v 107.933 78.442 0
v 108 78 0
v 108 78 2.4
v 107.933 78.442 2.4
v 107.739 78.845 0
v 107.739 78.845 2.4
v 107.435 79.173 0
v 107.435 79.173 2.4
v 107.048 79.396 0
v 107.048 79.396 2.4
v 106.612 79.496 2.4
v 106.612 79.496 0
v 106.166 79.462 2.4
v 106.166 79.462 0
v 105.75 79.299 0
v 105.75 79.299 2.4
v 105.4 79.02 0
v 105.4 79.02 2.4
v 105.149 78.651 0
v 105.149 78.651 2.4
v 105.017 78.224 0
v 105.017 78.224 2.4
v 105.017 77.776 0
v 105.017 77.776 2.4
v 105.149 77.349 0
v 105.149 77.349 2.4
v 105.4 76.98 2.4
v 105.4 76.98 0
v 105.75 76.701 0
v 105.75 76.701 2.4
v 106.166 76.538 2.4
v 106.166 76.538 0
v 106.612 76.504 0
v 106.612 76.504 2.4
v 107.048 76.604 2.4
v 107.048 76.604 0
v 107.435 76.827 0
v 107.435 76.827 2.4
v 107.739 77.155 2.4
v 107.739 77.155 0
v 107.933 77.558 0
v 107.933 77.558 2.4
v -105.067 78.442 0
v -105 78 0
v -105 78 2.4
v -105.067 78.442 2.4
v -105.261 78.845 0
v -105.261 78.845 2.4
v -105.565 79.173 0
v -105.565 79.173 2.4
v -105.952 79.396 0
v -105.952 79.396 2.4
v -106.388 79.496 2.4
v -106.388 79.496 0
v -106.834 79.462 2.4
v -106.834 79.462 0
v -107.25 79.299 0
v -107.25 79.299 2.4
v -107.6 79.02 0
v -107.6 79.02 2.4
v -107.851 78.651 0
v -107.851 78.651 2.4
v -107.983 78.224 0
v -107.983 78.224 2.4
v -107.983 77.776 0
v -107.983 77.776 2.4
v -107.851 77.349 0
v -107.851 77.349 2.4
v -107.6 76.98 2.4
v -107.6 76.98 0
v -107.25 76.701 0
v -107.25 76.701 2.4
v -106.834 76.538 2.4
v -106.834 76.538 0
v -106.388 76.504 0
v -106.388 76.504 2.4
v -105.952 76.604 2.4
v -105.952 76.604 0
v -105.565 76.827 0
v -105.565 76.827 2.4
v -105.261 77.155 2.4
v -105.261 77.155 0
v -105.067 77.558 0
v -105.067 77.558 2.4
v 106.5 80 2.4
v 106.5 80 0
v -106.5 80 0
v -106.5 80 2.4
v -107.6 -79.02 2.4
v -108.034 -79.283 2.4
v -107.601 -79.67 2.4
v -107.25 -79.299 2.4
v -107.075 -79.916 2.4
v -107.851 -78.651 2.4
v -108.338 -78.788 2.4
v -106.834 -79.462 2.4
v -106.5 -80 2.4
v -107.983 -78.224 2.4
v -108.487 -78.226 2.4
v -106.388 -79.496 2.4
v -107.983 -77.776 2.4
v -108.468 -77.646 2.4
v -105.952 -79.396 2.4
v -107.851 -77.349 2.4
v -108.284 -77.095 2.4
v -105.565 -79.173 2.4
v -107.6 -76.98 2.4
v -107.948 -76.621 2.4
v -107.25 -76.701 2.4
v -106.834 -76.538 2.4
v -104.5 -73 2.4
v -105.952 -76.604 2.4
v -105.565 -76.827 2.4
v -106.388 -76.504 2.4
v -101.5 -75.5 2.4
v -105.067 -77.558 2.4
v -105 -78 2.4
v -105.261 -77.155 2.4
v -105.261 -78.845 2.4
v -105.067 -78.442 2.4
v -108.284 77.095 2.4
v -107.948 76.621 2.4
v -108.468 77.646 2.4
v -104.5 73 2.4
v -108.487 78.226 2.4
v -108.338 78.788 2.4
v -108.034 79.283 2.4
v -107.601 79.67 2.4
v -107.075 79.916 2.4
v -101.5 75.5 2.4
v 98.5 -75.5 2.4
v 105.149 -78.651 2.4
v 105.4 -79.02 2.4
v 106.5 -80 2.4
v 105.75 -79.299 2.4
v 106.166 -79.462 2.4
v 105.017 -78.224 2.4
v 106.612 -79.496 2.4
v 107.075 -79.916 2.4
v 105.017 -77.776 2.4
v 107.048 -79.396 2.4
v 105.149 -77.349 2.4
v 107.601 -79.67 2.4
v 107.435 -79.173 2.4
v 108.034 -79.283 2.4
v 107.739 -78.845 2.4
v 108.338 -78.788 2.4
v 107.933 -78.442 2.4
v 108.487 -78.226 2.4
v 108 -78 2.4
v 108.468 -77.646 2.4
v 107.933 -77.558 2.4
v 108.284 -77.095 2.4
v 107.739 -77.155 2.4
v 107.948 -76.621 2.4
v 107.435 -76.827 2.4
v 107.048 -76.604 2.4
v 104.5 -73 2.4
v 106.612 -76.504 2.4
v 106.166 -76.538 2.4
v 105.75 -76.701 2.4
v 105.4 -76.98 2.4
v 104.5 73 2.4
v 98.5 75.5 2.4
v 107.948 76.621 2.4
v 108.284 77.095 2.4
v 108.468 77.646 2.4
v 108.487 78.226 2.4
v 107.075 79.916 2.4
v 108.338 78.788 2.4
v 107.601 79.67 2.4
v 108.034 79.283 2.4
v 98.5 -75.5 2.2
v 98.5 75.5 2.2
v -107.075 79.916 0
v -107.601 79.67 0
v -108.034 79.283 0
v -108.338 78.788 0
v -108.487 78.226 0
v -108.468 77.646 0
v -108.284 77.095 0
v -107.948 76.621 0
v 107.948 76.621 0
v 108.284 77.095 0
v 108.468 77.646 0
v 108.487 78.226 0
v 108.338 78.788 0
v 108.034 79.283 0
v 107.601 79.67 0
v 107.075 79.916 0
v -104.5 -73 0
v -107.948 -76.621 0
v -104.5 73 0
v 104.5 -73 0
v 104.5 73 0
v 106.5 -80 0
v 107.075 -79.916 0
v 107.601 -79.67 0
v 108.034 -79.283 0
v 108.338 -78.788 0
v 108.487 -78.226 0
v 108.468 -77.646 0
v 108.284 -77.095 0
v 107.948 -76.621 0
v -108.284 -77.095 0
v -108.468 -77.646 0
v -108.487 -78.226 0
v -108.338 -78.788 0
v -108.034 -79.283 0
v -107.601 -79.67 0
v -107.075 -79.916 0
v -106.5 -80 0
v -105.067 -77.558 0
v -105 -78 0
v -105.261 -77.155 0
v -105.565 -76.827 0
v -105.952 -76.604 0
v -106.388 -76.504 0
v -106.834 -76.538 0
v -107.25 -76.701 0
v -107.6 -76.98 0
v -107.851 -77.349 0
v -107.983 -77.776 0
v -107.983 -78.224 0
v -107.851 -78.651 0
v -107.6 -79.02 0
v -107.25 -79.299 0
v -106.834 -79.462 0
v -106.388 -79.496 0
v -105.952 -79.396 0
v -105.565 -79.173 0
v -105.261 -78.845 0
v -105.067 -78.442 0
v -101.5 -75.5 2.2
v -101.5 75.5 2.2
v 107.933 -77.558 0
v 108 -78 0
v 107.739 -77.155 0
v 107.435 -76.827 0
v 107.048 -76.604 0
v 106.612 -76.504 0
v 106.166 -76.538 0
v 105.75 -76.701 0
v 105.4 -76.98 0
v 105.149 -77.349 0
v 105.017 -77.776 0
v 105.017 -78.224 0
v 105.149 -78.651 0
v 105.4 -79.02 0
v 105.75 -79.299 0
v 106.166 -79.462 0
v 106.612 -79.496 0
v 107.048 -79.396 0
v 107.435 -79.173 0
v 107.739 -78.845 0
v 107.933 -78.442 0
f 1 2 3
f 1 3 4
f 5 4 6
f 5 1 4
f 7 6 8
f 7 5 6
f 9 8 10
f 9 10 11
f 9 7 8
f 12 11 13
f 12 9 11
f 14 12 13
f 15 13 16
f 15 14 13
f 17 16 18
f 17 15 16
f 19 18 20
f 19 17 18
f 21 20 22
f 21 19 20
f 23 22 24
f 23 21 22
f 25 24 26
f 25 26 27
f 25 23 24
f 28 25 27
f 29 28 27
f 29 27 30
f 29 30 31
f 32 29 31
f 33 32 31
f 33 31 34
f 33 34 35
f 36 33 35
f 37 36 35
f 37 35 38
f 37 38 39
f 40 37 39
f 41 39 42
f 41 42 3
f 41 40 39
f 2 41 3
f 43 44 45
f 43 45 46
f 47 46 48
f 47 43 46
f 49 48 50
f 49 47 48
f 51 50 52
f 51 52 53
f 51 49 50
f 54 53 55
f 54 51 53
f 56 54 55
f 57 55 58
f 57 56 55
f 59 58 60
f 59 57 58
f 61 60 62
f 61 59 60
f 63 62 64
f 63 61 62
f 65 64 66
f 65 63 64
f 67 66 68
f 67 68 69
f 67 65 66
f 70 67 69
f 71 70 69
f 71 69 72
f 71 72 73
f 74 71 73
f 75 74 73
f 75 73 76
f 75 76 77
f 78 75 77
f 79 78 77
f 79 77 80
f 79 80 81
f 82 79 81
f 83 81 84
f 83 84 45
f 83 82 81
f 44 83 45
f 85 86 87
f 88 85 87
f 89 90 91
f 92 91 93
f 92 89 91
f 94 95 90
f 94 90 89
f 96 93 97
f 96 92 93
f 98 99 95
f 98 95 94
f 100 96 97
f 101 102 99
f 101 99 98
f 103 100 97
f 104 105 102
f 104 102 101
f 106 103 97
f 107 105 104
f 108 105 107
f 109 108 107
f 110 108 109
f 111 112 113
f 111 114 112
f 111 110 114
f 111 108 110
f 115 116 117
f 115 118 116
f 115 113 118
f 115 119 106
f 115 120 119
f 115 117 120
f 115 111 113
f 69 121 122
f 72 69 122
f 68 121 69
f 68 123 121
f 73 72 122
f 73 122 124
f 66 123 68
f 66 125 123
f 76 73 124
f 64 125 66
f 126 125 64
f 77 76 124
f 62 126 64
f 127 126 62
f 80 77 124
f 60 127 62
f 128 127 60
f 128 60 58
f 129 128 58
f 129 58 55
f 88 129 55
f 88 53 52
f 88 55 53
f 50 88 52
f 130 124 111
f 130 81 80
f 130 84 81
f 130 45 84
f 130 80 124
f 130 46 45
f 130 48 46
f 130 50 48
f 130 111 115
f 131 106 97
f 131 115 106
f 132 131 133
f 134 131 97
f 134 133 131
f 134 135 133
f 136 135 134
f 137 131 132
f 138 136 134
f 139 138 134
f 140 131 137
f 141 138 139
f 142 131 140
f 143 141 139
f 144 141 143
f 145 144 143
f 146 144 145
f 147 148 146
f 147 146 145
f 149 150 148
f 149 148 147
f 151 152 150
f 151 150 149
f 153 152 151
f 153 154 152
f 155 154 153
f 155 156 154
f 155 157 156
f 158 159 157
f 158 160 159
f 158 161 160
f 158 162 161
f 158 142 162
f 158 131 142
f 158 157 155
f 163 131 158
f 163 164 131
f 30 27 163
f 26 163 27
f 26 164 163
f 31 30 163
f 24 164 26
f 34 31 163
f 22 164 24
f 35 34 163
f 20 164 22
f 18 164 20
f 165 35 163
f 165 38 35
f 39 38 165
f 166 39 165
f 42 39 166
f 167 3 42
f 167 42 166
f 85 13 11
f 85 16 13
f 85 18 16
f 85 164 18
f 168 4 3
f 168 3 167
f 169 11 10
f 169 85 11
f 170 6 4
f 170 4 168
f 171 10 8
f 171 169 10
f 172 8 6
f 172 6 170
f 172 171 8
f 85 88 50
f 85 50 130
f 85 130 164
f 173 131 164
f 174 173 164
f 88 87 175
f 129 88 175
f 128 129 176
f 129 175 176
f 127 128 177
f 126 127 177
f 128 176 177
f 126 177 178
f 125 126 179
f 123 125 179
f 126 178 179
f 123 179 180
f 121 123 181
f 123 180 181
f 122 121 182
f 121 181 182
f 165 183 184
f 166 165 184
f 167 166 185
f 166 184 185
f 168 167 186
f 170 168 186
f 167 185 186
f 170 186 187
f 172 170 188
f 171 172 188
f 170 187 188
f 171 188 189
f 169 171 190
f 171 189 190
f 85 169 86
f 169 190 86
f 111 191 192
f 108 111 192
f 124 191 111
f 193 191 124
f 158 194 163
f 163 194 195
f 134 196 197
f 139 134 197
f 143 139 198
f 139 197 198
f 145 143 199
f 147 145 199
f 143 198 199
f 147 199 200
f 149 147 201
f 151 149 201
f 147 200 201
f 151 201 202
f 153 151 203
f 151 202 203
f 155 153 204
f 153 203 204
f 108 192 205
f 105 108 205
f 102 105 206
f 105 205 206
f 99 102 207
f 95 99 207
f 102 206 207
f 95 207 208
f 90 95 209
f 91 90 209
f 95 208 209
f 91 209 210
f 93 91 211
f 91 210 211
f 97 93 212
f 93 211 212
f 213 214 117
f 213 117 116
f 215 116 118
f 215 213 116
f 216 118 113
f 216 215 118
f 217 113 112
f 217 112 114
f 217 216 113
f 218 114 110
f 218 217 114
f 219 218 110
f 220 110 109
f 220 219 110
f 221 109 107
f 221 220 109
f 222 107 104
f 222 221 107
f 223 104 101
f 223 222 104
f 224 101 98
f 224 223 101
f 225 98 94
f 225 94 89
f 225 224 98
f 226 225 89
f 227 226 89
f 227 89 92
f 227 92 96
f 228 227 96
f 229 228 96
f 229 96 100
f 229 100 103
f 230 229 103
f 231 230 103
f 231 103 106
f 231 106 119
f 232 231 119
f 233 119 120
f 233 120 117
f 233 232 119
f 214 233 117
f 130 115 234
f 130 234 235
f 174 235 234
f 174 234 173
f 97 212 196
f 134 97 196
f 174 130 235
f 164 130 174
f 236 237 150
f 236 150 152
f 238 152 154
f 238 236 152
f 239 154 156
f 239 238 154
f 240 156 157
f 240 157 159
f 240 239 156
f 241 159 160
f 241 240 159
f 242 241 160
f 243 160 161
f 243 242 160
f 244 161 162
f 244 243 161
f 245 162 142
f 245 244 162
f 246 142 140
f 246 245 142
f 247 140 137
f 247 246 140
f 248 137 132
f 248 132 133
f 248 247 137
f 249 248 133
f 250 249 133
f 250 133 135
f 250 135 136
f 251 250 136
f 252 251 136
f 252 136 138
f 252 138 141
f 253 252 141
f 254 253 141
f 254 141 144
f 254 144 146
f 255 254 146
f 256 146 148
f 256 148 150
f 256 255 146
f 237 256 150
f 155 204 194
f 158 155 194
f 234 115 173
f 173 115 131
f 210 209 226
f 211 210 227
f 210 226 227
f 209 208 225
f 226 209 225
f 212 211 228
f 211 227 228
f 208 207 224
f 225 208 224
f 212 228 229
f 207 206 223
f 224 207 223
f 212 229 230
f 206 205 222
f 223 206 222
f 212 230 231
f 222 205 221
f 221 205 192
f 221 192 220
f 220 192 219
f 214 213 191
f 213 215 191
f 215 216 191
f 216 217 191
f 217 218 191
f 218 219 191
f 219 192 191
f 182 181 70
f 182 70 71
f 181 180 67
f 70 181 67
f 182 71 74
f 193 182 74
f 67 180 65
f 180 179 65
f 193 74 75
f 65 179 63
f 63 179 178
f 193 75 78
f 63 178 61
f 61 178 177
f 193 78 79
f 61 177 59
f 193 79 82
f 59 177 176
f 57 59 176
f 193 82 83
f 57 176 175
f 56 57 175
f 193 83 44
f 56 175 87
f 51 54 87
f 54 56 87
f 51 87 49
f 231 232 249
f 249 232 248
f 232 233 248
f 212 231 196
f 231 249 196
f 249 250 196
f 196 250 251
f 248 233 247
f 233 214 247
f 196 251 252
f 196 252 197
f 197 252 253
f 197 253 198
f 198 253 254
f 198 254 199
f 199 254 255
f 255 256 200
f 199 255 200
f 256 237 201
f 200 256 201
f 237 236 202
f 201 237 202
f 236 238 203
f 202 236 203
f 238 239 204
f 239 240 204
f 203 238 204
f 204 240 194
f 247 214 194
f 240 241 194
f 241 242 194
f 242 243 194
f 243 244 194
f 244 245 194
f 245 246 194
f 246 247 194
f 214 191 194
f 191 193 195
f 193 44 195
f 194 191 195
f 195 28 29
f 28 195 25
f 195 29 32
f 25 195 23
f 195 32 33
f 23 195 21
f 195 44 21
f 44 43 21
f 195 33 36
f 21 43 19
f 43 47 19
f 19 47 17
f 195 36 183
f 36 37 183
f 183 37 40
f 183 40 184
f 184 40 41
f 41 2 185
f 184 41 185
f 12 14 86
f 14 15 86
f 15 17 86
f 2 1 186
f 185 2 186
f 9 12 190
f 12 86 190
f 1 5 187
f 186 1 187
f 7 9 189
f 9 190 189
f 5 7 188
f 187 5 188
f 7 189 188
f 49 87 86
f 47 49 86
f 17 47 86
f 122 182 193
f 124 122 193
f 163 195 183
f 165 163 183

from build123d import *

# Parameters (mm, degrees)
CROQUIS1_W              = 209
CROQUIS1_H              = 160
CROQUIS1_R              = 1.5
SALIENTE_EXTRUIR1_DEPTH = 2.4
CROQUIS2_W              = 200
CROQUIS2_H              = 151
CORTAR_EXTRUIR1_DEPTH   = 0.2


with BuildPart() as part:
    # Croquis1 → Saliente-Extruir1 (new body)
    with BuildSketch(Plane.XY):
        Rectangle(CROQUIS1_W, CROQUIS1_H)
        with BuildLine():
            Line((-104.5, 73), (-104.5, 80))
            Line((-104.5, 80), (-106.5, 80))
            ThreePointArc((-106.5, 80), (-108.33829006, 78.787838597), (-107.948275862, 76.620689655))
            Line((-107.948275862, 76.620689655), (-104.5, 73))
        make_face()
        with Locations((-106.5, 78)):
            Circle(CROQUIS1_R, mode=Mode.SUBTRACT)
        with BuildLine():
            Line((106.5, 80), (104.5, 80))
            Line((104.5, 80), (104.5, 73))
            Line((104.5, 73), (107.948275862, 76.620689655))
            ThreePointArc((107.948275862, 76.620689655), (108.33829006, 78.787838597), (106.5, 80))
        make_face()
        with Locations((106.5, 78)):
            Circle(CROQUIS1_R, mode=Mode.SUBTRACT)
        with BuildLine():
            Line((107.948275862, -76.620689655), (104.5, -73))
            Line((104.5, -73), (104.5, -80))
            Line((104.5, -80), (106.5, -80))
            ThreePointArc((106.5, -80), (108.33829006, -78.787838597), (107.948275862, -76.620689655))
        make_face()
        with Locations((106.5, -78)):
            Circle(CROQUIS1_R, mode=Mode.SUBTRACT)
        with BuildLine():
            Line((-104.5, -80), (-104.5, -73))
            Line((-104.5, -73), (-107.948275862, -76.620689655))
            ThreePointArc((-107.948275862, -76.620689655), (-108.33829006, -78.787838597), (-106.5, -80))
            Line((-106.5, -80), (-104.5, -80))
        make_face()
        with Locations((-106.5, -78)):
            Circle(CROQUIS1_R, mode=Mode.SUBTRACT)
    extrude(amount=SALIENTE_EXTRUIR1_DEPTH)

    # Croquis2 → Cortar-Extruir1 (cut)
    with BuildSketch(Plane.XY.offset(2.4)):
        with Locations((-1.5, 0)):
            Rectangle(CROQUIS2_W, CROQUIS2_H)
    extrude(amount=-CORTAR_EXTRUIR1_DEPTH, mode=Mode.SUBTRACT)


solid = part.part
